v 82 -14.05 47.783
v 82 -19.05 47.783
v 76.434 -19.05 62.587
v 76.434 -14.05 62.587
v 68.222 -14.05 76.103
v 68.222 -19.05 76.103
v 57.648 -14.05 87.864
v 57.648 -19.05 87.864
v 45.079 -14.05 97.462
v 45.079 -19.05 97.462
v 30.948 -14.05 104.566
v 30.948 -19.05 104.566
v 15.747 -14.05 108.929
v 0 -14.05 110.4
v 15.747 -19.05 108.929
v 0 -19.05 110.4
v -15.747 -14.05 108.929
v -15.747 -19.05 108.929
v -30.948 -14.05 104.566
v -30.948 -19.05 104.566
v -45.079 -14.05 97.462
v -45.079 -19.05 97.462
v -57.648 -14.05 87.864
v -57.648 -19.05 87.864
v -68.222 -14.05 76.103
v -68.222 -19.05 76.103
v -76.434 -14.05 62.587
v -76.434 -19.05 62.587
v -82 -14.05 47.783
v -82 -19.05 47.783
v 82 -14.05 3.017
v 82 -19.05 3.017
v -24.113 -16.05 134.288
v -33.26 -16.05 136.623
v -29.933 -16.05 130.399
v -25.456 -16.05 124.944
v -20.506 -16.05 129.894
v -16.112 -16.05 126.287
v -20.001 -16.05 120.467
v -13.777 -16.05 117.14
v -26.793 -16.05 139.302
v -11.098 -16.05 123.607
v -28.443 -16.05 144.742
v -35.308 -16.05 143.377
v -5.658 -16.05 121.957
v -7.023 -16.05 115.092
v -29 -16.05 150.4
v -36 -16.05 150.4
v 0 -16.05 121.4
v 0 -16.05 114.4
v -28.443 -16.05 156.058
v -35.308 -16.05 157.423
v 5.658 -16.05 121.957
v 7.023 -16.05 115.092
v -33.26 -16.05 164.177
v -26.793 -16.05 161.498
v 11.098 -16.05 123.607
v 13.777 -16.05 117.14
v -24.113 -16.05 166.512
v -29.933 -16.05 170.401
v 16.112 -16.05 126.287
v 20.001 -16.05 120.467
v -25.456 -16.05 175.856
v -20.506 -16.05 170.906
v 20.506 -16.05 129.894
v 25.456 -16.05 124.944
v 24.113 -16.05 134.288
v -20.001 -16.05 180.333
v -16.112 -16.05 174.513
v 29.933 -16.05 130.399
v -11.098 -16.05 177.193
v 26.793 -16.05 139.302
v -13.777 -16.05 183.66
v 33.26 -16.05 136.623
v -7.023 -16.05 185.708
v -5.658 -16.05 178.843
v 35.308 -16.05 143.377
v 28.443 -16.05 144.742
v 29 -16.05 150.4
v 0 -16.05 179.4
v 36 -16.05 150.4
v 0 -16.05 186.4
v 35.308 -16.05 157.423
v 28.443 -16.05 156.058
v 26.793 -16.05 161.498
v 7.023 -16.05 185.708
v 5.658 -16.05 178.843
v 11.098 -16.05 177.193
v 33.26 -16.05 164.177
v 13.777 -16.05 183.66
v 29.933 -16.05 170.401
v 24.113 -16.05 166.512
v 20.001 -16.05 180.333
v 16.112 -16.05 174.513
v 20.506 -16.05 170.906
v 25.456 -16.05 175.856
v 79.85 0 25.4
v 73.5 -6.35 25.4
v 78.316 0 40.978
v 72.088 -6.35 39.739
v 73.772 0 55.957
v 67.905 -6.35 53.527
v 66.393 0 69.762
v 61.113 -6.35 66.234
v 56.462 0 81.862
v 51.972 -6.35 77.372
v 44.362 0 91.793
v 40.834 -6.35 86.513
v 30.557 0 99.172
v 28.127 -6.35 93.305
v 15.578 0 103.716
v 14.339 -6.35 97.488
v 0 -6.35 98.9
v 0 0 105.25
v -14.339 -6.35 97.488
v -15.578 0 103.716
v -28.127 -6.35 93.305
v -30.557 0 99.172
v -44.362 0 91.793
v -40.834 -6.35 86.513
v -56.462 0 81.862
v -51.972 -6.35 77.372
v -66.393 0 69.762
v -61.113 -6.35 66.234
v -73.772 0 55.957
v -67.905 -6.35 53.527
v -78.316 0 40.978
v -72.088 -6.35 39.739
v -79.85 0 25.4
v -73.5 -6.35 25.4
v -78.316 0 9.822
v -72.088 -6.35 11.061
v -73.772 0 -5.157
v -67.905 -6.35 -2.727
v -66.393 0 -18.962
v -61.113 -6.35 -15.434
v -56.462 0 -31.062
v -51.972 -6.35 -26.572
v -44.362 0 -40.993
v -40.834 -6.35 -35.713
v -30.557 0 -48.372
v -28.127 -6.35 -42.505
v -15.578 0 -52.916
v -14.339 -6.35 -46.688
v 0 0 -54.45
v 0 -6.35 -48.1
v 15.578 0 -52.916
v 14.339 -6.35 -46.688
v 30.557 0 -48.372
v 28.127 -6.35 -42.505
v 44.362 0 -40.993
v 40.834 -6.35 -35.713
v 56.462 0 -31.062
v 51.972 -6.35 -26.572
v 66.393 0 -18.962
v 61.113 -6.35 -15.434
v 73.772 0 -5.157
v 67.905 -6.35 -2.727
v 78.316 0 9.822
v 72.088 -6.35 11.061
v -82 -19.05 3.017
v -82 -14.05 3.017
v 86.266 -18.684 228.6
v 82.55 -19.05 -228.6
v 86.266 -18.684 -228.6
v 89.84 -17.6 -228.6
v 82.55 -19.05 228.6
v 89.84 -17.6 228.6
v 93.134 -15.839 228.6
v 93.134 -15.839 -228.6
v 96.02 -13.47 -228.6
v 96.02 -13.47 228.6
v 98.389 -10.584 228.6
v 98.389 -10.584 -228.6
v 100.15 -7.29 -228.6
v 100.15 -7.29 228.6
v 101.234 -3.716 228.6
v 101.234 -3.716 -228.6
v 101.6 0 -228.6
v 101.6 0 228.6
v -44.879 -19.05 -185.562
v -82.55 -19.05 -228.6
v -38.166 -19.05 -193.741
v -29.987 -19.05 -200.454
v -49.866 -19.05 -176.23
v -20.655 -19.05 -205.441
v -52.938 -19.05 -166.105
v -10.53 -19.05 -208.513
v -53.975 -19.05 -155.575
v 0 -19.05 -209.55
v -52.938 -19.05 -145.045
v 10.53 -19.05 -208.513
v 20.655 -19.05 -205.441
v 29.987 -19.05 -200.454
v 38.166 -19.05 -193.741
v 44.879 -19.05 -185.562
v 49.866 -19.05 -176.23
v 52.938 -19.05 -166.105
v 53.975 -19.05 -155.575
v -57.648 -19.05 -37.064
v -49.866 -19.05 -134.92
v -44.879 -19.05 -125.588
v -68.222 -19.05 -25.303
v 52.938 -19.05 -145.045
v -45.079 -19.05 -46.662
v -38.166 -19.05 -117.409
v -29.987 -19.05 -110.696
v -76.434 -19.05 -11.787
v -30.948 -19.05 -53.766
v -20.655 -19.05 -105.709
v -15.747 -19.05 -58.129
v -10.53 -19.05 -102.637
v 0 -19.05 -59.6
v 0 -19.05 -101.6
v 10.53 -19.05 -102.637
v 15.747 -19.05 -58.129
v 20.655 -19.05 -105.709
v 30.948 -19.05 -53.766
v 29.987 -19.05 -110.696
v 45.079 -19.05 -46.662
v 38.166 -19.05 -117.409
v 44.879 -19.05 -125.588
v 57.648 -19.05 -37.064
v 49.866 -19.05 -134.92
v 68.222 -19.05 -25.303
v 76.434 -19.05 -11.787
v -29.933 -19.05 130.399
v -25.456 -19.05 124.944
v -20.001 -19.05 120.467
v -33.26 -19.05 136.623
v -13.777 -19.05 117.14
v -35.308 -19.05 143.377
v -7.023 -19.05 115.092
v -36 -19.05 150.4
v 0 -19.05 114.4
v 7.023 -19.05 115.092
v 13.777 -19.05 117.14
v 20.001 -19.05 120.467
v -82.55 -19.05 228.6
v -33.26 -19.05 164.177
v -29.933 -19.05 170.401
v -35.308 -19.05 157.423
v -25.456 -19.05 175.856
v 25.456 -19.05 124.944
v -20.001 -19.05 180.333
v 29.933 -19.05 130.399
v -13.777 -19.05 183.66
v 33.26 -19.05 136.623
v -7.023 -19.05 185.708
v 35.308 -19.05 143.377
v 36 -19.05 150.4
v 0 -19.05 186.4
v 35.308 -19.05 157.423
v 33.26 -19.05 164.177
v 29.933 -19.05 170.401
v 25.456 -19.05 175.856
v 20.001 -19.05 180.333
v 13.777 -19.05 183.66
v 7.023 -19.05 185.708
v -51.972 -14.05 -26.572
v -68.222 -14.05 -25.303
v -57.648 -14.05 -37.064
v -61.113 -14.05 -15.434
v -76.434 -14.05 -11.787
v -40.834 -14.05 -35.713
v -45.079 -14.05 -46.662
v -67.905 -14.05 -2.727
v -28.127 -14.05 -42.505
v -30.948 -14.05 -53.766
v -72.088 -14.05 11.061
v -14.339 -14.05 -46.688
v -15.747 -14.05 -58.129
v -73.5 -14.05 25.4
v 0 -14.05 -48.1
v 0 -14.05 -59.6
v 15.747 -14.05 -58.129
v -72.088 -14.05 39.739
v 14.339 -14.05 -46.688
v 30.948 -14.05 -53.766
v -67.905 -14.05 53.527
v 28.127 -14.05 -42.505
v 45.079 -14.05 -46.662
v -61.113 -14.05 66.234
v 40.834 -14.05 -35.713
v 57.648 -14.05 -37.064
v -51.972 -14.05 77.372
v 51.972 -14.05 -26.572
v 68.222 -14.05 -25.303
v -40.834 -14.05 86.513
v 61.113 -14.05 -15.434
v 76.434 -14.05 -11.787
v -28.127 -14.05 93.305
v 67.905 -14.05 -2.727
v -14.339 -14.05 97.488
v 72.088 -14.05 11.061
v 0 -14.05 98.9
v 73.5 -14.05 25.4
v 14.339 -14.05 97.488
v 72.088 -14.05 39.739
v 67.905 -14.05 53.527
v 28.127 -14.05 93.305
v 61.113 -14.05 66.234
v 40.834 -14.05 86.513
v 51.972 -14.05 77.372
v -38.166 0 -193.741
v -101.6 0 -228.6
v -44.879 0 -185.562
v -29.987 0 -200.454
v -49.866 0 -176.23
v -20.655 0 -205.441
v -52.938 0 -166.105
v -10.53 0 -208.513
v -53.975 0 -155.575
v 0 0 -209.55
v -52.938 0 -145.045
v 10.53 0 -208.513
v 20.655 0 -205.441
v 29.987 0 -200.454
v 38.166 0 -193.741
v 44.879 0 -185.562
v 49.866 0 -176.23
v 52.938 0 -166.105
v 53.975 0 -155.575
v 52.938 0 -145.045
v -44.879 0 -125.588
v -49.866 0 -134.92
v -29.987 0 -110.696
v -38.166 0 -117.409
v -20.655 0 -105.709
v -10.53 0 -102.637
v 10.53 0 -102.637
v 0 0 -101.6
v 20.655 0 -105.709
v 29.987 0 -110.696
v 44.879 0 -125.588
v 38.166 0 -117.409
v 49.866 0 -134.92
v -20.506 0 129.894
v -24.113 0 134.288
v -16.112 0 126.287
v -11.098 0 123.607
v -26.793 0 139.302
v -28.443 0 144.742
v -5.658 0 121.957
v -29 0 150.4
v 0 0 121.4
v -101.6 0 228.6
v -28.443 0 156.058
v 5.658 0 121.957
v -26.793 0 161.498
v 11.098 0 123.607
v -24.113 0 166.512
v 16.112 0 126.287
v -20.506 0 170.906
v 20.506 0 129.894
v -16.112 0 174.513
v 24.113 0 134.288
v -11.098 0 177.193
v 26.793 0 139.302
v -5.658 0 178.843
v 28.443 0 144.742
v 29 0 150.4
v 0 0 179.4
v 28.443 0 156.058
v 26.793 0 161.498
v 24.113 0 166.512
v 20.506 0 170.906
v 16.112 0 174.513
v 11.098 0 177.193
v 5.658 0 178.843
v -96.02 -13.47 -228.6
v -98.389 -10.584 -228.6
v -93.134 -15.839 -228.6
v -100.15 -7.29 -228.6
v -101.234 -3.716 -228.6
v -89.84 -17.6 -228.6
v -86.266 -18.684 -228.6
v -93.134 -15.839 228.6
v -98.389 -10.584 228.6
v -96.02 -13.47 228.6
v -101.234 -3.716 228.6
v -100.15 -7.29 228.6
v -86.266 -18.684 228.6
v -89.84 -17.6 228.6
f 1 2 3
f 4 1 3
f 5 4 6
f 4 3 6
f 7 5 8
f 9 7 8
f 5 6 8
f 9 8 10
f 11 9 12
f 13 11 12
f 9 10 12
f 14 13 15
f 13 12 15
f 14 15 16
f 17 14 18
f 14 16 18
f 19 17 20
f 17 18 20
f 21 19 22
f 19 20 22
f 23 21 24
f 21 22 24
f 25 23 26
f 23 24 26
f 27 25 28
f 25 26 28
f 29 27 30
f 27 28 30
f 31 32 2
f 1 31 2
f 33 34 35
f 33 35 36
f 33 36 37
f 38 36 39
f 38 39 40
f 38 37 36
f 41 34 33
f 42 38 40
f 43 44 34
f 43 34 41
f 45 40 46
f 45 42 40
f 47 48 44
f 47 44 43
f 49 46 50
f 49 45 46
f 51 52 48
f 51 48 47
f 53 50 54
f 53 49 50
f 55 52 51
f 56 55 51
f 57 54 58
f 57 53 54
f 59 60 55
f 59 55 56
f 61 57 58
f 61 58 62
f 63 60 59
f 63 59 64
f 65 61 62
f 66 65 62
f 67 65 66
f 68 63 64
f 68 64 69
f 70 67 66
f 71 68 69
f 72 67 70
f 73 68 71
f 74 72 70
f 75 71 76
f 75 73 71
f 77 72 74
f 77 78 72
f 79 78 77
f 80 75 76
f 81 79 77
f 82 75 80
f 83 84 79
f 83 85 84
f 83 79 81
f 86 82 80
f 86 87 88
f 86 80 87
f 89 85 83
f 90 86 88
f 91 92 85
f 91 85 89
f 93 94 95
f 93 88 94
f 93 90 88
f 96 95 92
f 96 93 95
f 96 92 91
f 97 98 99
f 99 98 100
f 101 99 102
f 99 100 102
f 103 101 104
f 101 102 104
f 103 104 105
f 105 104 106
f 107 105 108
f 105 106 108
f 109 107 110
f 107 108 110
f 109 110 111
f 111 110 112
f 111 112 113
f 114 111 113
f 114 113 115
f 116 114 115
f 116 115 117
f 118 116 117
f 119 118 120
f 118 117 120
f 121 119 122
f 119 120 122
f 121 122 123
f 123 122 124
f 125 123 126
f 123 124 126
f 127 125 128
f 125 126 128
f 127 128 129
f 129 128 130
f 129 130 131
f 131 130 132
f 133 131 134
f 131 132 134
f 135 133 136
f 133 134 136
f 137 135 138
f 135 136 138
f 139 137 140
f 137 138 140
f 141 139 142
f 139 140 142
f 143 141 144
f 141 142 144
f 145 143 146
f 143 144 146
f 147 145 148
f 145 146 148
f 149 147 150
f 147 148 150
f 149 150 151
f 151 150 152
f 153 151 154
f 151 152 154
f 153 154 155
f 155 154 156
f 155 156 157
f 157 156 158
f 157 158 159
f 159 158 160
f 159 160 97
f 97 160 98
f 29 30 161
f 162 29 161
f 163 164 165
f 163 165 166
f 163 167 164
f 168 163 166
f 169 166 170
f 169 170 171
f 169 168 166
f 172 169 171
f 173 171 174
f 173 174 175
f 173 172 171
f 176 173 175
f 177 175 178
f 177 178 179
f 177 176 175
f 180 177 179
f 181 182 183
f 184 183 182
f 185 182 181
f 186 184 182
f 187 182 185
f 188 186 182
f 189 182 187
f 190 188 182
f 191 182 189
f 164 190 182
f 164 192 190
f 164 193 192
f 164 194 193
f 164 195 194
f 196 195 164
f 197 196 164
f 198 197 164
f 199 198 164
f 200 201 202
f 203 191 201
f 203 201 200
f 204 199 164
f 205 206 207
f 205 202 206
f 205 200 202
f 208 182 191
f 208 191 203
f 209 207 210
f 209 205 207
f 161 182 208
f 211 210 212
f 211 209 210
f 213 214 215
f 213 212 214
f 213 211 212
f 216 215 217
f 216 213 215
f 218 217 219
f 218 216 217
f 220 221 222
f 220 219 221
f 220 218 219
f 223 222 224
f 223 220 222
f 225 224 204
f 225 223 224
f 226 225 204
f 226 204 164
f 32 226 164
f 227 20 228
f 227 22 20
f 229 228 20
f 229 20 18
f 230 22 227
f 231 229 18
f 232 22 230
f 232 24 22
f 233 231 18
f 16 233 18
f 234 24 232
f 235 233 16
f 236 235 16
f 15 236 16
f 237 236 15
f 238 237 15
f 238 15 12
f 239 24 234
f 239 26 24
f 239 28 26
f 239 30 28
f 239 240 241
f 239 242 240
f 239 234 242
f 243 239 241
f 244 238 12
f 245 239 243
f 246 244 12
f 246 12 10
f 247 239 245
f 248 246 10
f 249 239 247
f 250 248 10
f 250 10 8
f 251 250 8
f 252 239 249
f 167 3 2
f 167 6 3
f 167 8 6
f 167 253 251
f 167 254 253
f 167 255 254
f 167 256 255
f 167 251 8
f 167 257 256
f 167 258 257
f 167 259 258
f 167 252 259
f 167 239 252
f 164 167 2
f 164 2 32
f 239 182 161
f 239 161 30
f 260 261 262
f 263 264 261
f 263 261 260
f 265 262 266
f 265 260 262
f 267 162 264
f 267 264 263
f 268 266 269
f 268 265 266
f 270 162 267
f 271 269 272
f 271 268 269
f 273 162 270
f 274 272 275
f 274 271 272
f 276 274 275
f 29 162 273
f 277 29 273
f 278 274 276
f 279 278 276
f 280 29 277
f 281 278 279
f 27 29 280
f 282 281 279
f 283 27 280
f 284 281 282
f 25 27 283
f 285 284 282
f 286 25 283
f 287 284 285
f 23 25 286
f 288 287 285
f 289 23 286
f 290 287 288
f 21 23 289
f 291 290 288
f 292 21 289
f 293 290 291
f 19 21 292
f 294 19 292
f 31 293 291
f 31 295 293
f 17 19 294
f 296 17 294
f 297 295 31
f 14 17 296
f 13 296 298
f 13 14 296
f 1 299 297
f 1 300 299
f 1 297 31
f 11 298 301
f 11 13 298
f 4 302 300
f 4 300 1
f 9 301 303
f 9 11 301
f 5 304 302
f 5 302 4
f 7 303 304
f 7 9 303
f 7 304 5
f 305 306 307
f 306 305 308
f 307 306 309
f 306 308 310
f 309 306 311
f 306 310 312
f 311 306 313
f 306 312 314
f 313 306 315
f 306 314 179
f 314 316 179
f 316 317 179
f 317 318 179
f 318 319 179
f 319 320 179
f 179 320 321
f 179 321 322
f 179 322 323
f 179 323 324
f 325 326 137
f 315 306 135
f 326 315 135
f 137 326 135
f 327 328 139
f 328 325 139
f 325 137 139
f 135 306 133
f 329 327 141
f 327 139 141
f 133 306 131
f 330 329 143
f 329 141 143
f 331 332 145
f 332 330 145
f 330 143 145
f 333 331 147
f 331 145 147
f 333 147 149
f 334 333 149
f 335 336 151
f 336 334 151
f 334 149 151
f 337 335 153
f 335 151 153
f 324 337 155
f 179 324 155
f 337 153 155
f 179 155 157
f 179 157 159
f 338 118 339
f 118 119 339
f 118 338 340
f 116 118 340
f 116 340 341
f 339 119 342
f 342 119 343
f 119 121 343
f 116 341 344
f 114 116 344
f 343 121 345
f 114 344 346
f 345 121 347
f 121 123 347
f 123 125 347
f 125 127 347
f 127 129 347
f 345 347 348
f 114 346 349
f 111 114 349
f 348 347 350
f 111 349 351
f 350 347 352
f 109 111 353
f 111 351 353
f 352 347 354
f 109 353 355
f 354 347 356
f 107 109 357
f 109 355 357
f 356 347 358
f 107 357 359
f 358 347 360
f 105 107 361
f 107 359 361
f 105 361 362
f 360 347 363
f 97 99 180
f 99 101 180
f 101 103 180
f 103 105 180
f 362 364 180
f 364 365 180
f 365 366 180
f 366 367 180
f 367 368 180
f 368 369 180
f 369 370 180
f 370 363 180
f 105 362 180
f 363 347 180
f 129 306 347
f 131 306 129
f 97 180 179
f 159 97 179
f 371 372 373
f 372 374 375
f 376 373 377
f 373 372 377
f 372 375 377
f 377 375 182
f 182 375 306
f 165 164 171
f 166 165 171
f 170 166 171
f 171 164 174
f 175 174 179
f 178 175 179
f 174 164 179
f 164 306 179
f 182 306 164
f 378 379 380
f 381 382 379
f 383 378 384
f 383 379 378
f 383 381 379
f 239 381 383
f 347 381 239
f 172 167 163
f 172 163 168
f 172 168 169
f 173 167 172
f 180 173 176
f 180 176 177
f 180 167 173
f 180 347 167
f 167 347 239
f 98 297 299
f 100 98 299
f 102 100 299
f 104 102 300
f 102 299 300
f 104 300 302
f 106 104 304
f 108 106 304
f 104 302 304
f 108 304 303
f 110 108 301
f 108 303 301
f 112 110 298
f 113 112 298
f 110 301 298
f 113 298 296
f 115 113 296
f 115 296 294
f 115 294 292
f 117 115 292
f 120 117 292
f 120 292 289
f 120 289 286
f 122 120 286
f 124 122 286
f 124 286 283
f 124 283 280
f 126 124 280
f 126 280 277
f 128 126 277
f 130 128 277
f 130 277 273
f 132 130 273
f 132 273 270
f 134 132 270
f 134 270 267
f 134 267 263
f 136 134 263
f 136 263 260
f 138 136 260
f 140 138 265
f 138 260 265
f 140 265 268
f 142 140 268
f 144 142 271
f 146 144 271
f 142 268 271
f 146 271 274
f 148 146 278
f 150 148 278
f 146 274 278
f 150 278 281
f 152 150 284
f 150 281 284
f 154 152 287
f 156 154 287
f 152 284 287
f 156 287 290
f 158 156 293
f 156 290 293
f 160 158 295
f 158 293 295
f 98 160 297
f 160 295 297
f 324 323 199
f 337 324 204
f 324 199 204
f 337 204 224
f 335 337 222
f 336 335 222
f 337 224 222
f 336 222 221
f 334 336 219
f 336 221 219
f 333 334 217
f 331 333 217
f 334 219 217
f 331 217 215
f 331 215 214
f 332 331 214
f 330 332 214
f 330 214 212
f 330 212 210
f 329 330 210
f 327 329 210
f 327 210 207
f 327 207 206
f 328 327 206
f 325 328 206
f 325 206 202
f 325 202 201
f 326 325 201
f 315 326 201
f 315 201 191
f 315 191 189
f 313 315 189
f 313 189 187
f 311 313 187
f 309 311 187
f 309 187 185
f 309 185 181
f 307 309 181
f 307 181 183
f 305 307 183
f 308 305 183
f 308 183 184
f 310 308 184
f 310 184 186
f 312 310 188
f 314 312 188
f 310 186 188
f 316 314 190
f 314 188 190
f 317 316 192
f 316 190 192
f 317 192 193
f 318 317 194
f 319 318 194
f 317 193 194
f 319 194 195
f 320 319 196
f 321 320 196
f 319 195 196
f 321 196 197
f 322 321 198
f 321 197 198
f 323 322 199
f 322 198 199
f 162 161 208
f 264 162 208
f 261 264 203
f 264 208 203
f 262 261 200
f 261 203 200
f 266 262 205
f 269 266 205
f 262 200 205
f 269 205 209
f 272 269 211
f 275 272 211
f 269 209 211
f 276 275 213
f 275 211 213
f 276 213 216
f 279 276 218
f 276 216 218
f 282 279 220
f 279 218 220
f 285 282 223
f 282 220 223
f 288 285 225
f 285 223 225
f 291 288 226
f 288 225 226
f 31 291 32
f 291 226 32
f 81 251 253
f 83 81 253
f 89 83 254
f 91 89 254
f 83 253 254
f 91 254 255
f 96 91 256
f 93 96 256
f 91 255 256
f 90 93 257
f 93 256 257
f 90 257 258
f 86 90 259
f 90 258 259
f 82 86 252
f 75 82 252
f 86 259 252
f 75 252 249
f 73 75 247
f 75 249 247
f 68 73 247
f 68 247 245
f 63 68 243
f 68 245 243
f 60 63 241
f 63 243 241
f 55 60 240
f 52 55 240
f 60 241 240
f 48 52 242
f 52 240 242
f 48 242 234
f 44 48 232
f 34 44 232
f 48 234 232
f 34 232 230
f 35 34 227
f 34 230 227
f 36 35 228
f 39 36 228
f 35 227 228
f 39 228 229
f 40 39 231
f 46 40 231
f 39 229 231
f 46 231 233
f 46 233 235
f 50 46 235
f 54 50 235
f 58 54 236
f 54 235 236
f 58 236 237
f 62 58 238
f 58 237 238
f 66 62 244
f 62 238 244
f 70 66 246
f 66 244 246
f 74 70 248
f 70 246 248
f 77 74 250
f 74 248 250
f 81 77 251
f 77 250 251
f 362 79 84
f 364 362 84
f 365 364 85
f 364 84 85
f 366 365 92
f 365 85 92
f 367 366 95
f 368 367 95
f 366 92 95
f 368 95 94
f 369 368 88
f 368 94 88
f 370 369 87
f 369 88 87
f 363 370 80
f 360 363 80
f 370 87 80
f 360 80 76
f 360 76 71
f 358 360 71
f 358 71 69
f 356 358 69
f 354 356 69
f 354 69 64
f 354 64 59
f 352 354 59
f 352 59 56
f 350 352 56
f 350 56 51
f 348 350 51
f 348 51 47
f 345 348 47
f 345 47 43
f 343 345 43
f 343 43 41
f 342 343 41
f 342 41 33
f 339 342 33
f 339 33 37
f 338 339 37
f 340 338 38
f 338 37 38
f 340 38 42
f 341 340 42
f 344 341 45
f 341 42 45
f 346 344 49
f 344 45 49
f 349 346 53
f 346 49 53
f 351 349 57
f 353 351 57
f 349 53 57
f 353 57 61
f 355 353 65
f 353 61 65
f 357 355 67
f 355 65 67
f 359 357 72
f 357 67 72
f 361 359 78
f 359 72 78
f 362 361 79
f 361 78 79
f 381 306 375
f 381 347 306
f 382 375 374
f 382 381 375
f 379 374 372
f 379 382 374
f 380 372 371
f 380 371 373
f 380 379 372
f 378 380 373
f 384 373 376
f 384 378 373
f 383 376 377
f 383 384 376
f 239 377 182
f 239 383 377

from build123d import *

# Parameters (mm, degrees)
F0_W      = 203.2
F0_H      = 457.2
F1_DEPTH  = 19.05
F2_R      = 19.04999
F3_R      = 19.04999
F5_DEPTH  = 5
F6_R      = 73.5
F7_DEPTH  = 25.4
F8_SIZE   = 6.35
F9_R      = 36
F10_DEPTH = 3
F11_R     = 29
F12_DEPTH = 25.4
F13_R     = 53.975
F14_DEPTH = 25.4


# Not quite as in the source:
# - a fillet or chamfer is up to 0.001 mm smaller than in the source, because OpenCascade refuses the exact size


with BuildPart() as f1:
    # F0 (on Front) → F1 (new body)
    with BuildSketch(Plane.XZ):
        Rectangle(F0_W, F0_H)
    extrude(amount=F1_DEPTH)

    # F2 (radius 19.05 in the source; OpenCascade refuses exactly that, so slightly less here)
    f2_edges = [f1.edges().sort_by_distance(p)[0] for p in [
        (-101.6, -19.05, 0),
    ]]
    fillet(f2_edges, radius=F2_R)

    # F3 (radius 19.05 in the source; OpenCascade refuses exactly that, so slightly less here)
    f3_edges = [f1.edges().sort_by_distance(p)[0] for p in [
        (101.6, -19.05, 0),
    ]]
    fillet(f3_edges, radius=F3_R)

    # F4 (on face) → F5 (cut)
    with BuildSketch(Plane.XZ.offset(19.05)):
        with BuildLine():
            Line((82, 3.0169707144), (82, 47.7830292856))
            ThreePointArc((82, 47.7830292856), (0, 110.4), (-82, 47.7830292856))
            Line((-82, 47.7830292856), (-82, 3.0169707144))
            ThreePointArc((-82, 3.0169707144), (0, -59.6), (82, 3.0169707144))
        make_face()
    extrude(amount=-F5_DEPTH, mode=Mode.SUBTRACT)

    # F6 (on face) → F7 (cut)
    with BuildSketch(Plane.XZ.offset(19.05)):
        with Locations((0, 25.4)):
            Circle(F6_R)
    extrude(amount=-F7_DEPTH, mode=Mode.SUBTRACT)

    # F8
    f8_edges = [f1.edges().sort_by_distance(p)[0] for p in [
        (-73.5, 0, 25.4),
    ]]
    chamfer(f8_edges, length=F8_SIZE)

    # F9 (on face) → F10 (cut)
    with BuildSketch(Plane.XZ.offset(19.05)):
        with Locations((0, 150.4)):
            Circle(F9_R)
    extrude(amount=-F10_DEPTH, mode=Mode.SUBTRACT)

    # F11 (on face) → F12 (cut)
    with BuildSketch(Plane.XZ.offset(19.05)):
        with Locations((0, 150.4)):
            Circle(F11_R)
    extrude(amount=-F12_DEPTH, mode=Mode.SUBTRACT)

    # F13 (on face) → F14 (cut)
    with BuildSketch(Plane.XZ.offset(19.05)):
        with Locations((0, -155.575)):
            Circle(F13_R)
    extrude(amount=-F14_DEPTH, mode=Mode.SUBTRACT)


solid = f1.part
